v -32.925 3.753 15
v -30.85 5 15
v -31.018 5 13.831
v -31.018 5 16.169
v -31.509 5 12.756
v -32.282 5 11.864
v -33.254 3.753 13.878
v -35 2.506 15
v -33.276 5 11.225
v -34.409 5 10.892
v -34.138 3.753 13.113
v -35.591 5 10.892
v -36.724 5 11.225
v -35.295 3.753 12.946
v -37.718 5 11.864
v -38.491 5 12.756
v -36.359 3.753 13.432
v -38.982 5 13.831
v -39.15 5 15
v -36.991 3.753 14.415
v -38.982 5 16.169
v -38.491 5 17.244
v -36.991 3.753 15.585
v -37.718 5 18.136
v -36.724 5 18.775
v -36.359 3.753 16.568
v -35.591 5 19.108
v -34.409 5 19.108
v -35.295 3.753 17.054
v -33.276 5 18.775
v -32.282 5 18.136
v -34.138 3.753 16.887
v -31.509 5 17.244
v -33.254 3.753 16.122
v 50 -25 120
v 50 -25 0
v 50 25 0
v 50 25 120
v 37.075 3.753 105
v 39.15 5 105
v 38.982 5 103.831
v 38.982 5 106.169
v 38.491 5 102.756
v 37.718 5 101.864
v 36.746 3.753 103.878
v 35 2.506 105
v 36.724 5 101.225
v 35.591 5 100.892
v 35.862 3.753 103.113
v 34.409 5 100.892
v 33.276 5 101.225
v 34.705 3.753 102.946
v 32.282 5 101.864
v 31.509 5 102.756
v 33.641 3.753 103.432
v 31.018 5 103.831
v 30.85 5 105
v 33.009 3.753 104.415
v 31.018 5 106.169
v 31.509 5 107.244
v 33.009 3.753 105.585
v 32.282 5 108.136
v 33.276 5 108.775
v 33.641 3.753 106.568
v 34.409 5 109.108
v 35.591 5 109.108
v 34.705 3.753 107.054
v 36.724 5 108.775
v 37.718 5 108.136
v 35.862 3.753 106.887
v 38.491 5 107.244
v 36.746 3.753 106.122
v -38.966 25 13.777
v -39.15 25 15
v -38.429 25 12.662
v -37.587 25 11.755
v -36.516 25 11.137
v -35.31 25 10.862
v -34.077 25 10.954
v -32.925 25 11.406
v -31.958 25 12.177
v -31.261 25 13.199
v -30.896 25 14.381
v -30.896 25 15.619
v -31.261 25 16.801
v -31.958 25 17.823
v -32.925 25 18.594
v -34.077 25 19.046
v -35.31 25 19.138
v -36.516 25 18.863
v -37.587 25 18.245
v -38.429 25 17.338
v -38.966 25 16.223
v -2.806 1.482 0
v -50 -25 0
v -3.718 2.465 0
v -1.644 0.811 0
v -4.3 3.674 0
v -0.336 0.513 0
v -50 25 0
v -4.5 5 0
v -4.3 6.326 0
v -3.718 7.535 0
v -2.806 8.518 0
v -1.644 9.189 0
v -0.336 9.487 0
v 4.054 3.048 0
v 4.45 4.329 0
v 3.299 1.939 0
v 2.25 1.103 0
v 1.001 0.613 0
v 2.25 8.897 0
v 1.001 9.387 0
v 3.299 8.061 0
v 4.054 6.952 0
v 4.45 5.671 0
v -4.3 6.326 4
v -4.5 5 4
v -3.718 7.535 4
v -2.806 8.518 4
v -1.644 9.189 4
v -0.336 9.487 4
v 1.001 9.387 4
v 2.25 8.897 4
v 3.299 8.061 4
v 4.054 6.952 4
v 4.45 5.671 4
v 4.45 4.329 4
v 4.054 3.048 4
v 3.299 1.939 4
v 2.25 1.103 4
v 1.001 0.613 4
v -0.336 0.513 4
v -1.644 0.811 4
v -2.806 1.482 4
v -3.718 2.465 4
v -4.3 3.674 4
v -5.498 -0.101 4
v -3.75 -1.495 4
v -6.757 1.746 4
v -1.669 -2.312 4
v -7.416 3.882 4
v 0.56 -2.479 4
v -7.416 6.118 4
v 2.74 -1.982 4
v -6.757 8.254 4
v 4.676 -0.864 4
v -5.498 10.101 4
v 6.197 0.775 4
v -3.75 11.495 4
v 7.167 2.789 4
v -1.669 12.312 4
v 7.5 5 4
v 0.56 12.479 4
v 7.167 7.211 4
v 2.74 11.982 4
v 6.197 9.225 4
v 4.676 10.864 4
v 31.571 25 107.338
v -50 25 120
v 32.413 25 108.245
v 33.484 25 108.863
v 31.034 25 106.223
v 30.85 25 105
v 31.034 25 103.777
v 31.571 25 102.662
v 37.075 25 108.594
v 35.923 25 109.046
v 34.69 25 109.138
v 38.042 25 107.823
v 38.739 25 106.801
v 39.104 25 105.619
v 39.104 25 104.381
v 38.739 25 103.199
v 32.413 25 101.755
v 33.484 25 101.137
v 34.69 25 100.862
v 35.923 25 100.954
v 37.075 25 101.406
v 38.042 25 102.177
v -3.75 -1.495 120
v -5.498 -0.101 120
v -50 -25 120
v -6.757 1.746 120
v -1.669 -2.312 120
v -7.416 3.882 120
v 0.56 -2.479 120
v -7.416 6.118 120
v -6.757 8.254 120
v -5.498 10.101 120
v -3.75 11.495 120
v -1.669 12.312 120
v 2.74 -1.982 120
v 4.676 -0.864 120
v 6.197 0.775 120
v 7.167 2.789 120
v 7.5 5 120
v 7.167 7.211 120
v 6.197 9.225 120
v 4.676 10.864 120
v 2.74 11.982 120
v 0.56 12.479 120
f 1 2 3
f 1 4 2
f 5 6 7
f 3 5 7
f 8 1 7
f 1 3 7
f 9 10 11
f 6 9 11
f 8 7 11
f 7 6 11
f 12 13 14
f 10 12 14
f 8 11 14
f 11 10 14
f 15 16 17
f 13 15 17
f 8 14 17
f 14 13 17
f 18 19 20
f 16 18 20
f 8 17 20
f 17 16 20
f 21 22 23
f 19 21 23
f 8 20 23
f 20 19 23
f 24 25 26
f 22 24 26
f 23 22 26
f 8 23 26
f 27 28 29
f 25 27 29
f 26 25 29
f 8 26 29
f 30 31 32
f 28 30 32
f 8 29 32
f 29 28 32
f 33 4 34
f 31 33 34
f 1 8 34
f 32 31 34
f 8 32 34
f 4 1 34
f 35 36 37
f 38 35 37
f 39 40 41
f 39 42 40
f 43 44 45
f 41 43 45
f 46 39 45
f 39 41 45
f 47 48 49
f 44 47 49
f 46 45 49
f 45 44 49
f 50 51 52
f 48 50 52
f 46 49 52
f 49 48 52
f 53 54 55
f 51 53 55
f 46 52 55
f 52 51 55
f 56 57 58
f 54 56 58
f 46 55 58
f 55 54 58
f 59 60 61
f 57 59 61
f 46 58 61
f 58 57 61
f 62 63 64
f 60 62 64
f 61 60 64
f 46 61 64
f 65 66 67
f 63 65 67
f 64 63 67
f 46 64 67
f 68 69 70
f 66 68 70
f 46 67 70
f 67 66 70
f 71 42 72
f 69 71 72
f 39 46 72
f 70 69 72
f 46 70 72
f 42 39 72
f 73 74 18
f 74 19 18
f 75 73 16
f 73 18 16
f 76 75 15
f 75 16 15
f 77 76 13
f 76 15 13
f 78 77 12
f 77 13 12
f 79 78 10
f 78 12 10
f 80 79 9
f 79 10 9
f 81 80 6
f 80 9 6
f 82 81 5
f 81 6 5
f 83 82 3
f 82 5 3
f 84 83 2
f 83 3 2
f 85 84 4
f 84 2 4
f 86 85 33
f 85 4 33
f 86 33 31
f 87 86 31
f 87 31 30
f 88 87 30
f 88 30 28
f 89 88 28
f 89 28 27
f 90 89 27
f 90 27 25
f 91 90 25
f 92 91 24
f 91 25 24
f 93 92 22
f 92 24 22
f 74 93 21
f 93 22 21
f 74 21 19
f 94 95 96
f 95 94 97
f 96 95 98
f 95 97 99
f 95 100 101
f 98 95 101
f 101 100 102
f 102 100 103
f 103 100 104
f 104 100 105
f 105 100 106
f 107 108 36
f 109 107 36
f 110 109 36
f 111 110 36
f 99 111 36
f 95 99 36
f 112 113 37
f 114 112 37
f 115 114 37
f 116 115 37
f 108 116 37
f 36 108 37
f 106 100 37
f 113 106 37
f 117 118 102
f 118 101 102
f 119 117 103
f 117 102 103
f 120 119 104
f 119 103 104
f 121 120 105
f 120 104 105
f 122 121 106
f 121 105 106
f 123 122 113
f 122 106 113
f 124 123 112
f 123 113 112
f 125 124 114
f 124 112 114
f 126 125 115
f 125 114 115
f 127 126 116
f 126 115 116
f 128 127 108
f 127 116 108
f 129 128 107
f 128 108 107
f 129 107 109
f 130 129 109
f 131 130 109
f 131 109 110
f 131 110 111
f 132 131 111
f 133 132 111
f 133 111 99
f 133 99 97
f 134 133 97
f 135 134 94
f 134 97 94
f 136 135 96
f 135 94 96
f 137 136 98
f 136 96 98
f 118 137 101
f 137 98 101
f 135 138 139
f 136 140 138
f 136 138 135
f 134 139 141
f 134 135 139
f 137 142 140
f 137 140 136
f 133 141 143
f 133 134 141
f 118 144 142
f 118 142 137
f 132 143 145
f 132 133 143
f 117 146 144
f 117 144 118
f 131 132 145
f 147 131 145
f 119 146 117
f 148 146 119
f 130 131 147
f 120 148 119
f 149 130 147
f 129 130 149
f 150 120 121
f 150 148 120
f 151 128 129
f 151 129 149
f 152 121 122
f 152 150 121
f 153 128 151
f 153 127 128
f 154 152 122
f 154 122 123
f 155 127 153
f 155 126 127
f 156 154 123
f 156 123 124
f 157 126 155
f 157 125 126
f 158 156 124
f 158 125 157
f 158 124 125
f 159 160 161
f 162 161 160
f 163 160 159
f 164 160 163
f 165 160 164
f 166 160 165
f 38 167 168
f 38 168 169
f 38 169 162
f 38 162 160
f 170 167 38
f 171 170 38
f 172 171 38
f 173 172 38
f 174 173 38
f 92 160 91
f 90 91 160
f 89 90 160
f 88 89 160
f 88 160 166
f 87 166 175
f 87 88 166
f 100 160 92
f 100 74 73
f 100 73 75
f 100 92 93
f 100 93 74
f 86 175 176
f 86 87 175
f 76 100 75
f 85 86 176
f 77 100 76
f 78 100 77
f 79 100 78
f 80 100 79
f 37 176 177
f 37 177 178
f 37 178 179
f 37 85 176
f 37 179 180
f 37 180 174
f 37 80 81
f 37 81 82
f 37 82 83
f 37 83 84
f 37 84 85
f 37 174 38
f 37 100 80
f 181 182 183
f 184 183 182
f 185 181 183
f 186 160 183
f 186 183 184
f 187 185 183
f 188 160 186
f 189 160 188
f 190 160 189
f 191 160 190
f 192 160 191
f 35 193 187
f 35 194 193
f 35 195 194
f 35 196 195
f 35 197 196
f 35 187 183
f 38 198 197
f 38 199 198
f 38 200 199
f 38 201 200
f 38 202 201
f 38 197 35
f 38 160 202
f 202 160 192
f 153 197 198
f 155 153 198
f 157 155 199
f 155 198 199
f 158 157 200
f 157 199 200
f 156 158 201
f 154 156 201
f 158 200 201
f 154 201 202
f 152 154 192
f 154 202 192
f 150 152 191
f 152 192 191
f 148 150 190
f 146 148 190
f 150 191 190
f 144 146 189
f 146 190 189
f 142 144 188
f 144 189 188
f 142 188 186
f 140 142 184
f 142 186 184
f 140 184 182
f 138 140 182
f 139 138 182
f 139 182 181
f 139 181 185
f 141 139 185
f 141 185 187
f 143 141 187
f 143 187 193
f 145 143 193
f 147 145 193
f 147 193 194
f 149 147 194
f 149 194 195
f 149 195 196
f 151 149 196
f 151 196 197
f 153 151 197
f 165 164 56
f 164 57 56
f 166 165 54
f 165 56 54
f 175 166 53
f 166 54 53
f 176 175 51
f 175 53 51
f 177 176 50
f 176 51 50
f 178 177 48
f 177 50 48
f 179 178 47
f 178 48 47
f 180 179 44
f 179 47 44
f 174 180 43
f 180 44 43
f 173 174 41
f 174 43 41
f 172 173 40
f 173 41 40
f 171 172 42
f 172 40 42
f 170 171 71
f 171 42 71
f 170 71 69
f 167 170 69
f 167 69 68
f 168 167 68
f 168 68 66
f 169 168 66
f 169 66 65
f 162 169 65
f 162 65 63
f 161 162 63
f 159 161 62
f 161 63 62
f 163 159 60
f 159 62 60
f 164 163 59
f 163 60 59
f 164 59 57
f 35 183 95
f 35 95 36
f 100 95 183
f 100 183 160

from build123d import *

# Parameters (mm, degrees)
SKIZZE1_W                                           = 100
SKIZZE1_H                                           = 50
AUFSATZ_LINEAR_AUSTRAGEN1_DEPTH                     = 120
KERNLOCH_F_R_M8_HELICOIL1_D                         = 8.3
KERNLOCH_F_R_M8_HELICOIL1_DEPTH                     = 20
KERNLOCH_F_R_M8_HELICOIL1_TIP                       = 2.493571569
STIRNSENKUNG_F_R_M8_SENKSCHRAUBE_KOPF_B_D           = 9
STIRNSENKUNG_F_R_M8_SENKSCHRAUBE_KOPF_B_CBORE_D     = 15
STIRNSENKUNG_F_R_M8_SENKSCHRAUBE_KOPF_B_CBORE_DEPTH = 116


with BuildPart() as part:
    # Skizze1 → Aufsatz-Linear austragen1 (new body)
    with BuildSketch(Plane.XY):
        Rectangle(SKIZZE1_W, SKIZZE1_H)
    extrude(amount=AUFSATZ_LINEAR_AUSTRAGEN1_DEPTH)

    # Kernloch für M8 Helicoil1
    with Locations(Plane(origin=(0, 25, 0), x_dir=(1, 0, 0), z_dir=(0, 1, 0))):
        with Locations((35, -105), (-35, -15)):
            Hole(KERNLOCH_F_R_M8_HELICOIL1_D / 2, depth=KERNLOCH_F_R_M8_HELICOIL1_DEPTH)
            with Locations((0, 0, -(KERNLOCH_F_R_M8_HELICOIL1_DEPTH + KERNLOCH_F_R_M8_HELICOIL1_TIP / 2))):  # 118° drill point
                Cone(0, KERNLOCH_F_R_M8_HELICOIL1_D / 2, KERNLOCH_F_R_M8_HELICOIL1_TIP, mode=Mode.SUBTRACT)

    # Stirnsenkung für M8 Senkschraube (Kopf Button)1 (through all)
    with Locations(Plane.XY.offset(120)):
        with Locations((4.444e-06, 5)):
            CounterBoreHole(STIRNSENKUNG_F_R_M8_SENKSCHRAUBE_KOPF_B_D / 2, STIRNSENKUNG_F_R_M8_SENKSCHRAUBE_KOPF_B_CBORE_D / 2, STIRNSENKUNG_F_R_M8_SENKSCHRAUBE_KOPF_B_CBORE_DEPTH)


solid = part.part
